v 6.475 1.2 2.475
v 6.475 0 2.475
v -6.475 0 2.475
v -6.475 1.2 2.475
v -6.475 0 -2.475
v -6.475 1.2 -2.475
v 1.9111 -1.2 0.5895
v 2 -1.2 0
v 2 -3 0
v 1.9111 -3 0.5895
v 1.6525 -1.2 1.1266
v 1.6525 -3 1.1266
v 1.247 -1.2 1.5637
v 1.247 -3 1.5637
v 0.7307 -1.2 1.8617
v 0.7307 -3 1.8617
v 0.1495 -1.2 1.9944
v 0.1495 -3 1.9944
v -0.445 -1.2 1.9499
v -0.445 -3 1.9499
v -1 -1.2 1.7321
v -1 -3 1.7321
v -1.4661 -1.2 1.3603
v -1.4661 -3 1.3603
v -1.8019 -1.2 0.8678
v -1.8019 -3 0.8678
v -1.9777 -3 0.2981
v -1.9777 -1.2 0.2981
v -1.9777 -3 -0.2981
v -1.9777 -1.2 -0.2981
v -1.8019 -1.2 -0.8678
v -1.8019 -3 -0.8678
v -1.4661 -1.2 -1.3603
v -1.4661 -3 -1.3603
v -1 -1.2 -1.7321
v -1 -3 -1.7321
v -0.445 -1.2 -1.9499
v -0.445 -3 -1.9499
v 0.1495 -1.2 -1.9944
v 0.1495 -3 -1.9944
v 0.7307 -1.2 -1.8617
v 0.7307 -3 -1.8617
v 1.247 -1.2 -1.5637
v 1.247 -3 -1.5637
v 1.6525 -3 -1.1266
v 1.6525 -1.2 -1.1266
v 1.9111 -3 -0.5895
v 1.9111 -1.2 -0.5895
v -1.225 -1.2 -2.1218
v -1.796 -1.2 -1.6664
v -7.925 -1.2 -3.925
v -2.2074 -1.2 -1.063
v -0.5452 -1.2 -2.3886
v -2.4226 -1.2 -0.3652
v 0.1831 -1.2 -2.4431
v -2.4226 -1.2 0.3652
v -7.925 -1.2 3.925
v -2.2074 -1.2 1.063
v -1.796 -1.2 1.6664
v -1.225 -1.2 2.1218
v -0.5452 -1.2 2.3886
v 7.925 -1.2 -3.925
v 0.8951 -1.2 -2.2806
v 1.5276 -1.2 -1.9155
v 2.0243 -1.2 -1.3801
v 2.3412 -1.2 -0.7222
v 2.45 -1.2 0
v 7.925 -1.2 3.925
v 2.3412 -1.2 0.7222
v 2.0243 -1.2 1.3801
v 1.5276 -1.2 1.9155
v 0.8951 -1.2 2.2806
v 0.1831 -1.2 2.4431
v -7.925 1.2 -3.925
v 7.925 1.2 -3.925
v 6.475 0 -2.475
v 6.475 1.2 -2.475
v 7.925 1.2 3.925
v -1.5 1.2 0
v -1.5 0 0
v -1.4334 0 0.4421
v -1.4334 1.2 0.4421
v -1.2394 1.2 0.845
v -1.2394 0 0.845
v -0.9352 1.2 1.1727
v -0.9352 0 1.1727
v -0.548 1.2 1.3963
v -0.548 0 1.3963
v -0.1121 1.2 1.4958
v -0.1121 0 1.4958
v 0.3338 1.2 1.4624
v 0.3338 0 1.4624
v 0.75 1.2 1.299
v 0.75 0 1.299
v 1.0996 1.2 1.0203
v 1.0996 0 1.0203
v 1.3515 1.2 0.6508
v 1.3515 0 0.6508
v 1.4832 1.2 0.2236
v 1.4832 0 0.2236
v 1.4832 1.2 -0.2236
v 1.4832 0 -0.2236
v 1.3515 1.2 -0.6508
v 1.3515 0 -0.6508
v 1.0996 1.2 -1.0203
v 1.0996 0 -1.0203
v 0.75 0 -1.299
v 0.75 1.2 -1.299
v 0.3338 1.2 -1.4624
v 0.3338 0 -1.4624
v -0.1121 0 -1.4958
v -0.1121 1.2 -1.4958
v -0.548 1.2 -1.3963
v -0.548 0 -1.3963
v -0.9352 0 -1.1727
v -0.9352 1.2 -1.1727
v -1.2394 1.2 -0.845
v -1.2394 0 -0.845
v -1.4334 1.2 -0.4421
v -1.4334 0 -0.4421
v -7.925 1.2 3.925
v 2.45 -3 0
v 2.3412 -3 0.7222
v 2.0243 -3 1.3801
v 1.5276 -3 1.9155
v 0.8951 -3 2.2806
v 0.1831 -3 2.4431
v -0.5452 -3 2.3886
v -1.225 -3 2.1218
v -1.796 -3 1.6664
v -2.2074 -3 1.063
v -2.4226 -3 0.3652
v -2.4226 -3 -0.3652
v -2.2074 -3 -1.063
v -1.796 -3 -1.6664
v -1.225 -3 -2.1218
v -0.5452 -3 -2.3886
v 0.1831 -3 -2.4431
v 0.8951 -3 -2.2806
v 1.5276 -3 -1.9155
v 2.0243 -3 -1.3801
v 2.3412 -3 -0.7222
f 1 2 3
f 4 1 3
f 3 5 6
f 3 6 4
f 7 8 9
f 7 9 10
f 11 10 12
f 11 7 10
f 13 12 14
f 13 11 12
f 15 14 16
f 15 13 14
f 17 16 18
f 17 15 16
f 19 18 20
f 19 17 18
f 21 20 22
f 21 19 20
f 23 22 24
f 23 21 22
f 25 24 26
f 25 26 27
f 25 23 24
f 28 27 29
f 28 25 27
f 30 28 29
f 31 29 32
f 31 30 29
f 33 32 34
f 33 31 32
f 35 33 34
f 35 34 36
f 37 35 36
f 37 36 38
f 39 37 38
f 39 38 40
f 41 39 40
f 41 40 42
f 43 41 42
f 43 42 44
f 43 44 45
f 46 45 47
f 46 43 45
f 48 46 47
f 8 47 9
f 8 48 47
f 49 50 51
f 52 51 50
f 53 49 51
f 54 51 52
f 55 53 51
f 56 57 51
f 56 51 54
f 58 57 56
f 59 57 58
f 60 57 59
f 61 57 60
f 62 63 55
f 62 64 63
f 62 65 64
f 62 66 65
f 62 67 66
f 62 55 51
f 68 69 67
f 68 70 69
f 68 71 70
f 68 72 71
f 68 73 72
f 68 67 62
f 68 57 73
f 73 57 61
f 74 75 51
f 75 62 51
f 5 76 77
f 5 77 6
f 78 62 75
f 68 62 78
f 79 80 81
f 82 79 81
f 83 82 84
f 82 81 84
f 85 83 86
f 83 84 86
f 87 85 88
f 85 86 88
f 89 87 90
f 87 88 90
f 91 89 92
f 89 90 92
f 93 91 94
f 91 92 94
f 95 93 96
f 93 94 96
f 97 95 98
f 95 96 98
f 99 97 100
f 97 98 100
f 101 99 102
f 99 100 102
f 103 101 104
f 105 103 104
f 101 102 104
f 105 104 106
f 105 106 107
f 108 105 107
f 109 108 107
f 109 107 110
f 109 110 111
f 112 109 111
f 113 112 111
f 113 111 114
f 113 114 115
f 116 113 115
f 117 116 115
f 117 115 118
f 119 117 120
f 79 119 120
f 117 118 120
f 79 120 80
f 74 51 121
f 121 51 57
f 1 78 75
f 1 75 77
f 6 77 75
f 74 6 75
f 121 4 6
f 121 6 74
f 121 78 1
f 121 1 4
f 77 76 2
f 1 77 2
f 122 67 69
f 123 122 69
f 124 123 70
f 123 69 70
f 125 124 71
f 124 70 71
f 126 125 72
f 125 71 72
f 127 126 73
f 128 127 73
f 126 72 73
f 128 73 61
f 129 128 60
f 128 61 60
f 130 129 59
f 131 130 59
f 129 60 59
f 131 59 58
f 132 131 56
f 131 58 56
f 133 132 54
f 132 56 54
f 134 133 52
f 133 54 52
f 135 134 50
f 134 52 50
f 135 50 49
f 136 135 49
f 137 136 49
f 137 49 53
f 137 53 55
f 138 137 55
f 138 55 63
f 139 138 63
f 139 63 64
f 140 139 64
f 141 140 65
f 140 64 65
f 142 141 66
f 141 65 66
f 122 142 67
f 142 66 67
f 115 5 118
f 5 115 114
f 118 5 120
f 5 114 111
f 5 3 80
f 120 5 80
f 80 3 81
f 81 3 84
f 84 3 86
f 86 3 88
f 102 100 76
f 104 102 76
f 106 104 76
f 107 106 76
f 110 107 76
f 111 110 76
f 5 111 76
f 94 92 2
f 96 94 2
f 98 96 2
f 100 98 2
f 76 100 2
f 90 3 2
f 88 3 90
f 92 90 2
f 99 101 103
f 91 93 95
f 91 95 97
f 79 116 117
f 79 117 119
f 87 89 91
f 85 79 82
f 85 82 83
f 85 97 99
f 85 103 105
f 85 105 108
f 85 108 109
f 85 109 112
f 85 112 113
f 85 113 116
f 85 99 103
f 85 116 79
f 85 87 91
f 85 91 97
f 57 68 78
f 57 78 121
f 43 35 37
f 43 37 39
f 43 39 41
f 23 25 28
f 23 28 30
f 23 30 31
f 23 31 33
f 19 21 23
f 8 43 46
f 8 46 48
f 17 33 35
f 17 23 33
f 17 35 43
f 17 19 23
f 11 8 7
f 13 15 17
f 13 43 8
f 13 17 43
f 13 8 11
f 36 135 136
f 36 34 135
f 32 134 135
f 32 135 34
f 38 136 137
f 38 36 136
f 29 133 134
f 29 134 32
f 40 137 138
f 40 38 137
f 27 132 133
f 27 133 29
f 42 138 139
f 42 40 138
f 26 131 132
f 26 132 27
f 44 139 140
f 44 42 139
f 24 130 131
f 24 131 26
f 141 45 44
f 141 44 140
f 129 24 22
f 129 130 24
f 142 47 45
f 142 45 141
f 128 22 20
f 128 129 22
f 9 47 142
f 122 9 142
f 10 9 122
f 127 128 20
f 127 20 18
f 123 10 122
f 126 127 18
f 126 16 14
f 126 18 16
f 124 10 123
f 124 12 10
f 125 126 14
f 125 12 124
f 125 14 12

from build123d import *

# Parameters (mm, degrees)
F0_W     = 15.85
F0_H     = 7.85
F1_DEPTH = 1.2
F2_R     = 2.45
F2_R_2   = 2
F3_DEPTH = 1.8
F4_W     = 15.85
F4_H     = 7.85
F4_W_2   = 12.95
F4_H_2   = 4.95
F4_R     = 1.5
F5_DEPTH = 1.2


with BuildPart() as f1:
    # F0 (on Front) → F1 (new body)
    with BuildSketch(Plane.XZ):
        Rectangle(F0_W, F0_H)
    extrude(amount=F1_DEPTH)

    # F2 (on face) → F3 (join)
    with BuildSketch(Plane.XZ.offset(1.2)):
        Circle(F2_R)
        Circle(F2_R_2, mode=Mode.SUBTRACT)
    extrude(amount=F3_DEPTH)

    # F4 (on face) → F5 (join)
    with BuildSketch(Plane(origin=(0, 0, 0), x_dir=(-1, 0, 0), z_dir=(0, 1, 0))):
        Rectangle(F4_W, F4_H)
        Rectangle(F4_W_2, F4_H_2, mode=Mode.SUBTRACT)
        Circle(F4_R)
    extrude(amount=F5_DEPTH)


solid = f1.part
